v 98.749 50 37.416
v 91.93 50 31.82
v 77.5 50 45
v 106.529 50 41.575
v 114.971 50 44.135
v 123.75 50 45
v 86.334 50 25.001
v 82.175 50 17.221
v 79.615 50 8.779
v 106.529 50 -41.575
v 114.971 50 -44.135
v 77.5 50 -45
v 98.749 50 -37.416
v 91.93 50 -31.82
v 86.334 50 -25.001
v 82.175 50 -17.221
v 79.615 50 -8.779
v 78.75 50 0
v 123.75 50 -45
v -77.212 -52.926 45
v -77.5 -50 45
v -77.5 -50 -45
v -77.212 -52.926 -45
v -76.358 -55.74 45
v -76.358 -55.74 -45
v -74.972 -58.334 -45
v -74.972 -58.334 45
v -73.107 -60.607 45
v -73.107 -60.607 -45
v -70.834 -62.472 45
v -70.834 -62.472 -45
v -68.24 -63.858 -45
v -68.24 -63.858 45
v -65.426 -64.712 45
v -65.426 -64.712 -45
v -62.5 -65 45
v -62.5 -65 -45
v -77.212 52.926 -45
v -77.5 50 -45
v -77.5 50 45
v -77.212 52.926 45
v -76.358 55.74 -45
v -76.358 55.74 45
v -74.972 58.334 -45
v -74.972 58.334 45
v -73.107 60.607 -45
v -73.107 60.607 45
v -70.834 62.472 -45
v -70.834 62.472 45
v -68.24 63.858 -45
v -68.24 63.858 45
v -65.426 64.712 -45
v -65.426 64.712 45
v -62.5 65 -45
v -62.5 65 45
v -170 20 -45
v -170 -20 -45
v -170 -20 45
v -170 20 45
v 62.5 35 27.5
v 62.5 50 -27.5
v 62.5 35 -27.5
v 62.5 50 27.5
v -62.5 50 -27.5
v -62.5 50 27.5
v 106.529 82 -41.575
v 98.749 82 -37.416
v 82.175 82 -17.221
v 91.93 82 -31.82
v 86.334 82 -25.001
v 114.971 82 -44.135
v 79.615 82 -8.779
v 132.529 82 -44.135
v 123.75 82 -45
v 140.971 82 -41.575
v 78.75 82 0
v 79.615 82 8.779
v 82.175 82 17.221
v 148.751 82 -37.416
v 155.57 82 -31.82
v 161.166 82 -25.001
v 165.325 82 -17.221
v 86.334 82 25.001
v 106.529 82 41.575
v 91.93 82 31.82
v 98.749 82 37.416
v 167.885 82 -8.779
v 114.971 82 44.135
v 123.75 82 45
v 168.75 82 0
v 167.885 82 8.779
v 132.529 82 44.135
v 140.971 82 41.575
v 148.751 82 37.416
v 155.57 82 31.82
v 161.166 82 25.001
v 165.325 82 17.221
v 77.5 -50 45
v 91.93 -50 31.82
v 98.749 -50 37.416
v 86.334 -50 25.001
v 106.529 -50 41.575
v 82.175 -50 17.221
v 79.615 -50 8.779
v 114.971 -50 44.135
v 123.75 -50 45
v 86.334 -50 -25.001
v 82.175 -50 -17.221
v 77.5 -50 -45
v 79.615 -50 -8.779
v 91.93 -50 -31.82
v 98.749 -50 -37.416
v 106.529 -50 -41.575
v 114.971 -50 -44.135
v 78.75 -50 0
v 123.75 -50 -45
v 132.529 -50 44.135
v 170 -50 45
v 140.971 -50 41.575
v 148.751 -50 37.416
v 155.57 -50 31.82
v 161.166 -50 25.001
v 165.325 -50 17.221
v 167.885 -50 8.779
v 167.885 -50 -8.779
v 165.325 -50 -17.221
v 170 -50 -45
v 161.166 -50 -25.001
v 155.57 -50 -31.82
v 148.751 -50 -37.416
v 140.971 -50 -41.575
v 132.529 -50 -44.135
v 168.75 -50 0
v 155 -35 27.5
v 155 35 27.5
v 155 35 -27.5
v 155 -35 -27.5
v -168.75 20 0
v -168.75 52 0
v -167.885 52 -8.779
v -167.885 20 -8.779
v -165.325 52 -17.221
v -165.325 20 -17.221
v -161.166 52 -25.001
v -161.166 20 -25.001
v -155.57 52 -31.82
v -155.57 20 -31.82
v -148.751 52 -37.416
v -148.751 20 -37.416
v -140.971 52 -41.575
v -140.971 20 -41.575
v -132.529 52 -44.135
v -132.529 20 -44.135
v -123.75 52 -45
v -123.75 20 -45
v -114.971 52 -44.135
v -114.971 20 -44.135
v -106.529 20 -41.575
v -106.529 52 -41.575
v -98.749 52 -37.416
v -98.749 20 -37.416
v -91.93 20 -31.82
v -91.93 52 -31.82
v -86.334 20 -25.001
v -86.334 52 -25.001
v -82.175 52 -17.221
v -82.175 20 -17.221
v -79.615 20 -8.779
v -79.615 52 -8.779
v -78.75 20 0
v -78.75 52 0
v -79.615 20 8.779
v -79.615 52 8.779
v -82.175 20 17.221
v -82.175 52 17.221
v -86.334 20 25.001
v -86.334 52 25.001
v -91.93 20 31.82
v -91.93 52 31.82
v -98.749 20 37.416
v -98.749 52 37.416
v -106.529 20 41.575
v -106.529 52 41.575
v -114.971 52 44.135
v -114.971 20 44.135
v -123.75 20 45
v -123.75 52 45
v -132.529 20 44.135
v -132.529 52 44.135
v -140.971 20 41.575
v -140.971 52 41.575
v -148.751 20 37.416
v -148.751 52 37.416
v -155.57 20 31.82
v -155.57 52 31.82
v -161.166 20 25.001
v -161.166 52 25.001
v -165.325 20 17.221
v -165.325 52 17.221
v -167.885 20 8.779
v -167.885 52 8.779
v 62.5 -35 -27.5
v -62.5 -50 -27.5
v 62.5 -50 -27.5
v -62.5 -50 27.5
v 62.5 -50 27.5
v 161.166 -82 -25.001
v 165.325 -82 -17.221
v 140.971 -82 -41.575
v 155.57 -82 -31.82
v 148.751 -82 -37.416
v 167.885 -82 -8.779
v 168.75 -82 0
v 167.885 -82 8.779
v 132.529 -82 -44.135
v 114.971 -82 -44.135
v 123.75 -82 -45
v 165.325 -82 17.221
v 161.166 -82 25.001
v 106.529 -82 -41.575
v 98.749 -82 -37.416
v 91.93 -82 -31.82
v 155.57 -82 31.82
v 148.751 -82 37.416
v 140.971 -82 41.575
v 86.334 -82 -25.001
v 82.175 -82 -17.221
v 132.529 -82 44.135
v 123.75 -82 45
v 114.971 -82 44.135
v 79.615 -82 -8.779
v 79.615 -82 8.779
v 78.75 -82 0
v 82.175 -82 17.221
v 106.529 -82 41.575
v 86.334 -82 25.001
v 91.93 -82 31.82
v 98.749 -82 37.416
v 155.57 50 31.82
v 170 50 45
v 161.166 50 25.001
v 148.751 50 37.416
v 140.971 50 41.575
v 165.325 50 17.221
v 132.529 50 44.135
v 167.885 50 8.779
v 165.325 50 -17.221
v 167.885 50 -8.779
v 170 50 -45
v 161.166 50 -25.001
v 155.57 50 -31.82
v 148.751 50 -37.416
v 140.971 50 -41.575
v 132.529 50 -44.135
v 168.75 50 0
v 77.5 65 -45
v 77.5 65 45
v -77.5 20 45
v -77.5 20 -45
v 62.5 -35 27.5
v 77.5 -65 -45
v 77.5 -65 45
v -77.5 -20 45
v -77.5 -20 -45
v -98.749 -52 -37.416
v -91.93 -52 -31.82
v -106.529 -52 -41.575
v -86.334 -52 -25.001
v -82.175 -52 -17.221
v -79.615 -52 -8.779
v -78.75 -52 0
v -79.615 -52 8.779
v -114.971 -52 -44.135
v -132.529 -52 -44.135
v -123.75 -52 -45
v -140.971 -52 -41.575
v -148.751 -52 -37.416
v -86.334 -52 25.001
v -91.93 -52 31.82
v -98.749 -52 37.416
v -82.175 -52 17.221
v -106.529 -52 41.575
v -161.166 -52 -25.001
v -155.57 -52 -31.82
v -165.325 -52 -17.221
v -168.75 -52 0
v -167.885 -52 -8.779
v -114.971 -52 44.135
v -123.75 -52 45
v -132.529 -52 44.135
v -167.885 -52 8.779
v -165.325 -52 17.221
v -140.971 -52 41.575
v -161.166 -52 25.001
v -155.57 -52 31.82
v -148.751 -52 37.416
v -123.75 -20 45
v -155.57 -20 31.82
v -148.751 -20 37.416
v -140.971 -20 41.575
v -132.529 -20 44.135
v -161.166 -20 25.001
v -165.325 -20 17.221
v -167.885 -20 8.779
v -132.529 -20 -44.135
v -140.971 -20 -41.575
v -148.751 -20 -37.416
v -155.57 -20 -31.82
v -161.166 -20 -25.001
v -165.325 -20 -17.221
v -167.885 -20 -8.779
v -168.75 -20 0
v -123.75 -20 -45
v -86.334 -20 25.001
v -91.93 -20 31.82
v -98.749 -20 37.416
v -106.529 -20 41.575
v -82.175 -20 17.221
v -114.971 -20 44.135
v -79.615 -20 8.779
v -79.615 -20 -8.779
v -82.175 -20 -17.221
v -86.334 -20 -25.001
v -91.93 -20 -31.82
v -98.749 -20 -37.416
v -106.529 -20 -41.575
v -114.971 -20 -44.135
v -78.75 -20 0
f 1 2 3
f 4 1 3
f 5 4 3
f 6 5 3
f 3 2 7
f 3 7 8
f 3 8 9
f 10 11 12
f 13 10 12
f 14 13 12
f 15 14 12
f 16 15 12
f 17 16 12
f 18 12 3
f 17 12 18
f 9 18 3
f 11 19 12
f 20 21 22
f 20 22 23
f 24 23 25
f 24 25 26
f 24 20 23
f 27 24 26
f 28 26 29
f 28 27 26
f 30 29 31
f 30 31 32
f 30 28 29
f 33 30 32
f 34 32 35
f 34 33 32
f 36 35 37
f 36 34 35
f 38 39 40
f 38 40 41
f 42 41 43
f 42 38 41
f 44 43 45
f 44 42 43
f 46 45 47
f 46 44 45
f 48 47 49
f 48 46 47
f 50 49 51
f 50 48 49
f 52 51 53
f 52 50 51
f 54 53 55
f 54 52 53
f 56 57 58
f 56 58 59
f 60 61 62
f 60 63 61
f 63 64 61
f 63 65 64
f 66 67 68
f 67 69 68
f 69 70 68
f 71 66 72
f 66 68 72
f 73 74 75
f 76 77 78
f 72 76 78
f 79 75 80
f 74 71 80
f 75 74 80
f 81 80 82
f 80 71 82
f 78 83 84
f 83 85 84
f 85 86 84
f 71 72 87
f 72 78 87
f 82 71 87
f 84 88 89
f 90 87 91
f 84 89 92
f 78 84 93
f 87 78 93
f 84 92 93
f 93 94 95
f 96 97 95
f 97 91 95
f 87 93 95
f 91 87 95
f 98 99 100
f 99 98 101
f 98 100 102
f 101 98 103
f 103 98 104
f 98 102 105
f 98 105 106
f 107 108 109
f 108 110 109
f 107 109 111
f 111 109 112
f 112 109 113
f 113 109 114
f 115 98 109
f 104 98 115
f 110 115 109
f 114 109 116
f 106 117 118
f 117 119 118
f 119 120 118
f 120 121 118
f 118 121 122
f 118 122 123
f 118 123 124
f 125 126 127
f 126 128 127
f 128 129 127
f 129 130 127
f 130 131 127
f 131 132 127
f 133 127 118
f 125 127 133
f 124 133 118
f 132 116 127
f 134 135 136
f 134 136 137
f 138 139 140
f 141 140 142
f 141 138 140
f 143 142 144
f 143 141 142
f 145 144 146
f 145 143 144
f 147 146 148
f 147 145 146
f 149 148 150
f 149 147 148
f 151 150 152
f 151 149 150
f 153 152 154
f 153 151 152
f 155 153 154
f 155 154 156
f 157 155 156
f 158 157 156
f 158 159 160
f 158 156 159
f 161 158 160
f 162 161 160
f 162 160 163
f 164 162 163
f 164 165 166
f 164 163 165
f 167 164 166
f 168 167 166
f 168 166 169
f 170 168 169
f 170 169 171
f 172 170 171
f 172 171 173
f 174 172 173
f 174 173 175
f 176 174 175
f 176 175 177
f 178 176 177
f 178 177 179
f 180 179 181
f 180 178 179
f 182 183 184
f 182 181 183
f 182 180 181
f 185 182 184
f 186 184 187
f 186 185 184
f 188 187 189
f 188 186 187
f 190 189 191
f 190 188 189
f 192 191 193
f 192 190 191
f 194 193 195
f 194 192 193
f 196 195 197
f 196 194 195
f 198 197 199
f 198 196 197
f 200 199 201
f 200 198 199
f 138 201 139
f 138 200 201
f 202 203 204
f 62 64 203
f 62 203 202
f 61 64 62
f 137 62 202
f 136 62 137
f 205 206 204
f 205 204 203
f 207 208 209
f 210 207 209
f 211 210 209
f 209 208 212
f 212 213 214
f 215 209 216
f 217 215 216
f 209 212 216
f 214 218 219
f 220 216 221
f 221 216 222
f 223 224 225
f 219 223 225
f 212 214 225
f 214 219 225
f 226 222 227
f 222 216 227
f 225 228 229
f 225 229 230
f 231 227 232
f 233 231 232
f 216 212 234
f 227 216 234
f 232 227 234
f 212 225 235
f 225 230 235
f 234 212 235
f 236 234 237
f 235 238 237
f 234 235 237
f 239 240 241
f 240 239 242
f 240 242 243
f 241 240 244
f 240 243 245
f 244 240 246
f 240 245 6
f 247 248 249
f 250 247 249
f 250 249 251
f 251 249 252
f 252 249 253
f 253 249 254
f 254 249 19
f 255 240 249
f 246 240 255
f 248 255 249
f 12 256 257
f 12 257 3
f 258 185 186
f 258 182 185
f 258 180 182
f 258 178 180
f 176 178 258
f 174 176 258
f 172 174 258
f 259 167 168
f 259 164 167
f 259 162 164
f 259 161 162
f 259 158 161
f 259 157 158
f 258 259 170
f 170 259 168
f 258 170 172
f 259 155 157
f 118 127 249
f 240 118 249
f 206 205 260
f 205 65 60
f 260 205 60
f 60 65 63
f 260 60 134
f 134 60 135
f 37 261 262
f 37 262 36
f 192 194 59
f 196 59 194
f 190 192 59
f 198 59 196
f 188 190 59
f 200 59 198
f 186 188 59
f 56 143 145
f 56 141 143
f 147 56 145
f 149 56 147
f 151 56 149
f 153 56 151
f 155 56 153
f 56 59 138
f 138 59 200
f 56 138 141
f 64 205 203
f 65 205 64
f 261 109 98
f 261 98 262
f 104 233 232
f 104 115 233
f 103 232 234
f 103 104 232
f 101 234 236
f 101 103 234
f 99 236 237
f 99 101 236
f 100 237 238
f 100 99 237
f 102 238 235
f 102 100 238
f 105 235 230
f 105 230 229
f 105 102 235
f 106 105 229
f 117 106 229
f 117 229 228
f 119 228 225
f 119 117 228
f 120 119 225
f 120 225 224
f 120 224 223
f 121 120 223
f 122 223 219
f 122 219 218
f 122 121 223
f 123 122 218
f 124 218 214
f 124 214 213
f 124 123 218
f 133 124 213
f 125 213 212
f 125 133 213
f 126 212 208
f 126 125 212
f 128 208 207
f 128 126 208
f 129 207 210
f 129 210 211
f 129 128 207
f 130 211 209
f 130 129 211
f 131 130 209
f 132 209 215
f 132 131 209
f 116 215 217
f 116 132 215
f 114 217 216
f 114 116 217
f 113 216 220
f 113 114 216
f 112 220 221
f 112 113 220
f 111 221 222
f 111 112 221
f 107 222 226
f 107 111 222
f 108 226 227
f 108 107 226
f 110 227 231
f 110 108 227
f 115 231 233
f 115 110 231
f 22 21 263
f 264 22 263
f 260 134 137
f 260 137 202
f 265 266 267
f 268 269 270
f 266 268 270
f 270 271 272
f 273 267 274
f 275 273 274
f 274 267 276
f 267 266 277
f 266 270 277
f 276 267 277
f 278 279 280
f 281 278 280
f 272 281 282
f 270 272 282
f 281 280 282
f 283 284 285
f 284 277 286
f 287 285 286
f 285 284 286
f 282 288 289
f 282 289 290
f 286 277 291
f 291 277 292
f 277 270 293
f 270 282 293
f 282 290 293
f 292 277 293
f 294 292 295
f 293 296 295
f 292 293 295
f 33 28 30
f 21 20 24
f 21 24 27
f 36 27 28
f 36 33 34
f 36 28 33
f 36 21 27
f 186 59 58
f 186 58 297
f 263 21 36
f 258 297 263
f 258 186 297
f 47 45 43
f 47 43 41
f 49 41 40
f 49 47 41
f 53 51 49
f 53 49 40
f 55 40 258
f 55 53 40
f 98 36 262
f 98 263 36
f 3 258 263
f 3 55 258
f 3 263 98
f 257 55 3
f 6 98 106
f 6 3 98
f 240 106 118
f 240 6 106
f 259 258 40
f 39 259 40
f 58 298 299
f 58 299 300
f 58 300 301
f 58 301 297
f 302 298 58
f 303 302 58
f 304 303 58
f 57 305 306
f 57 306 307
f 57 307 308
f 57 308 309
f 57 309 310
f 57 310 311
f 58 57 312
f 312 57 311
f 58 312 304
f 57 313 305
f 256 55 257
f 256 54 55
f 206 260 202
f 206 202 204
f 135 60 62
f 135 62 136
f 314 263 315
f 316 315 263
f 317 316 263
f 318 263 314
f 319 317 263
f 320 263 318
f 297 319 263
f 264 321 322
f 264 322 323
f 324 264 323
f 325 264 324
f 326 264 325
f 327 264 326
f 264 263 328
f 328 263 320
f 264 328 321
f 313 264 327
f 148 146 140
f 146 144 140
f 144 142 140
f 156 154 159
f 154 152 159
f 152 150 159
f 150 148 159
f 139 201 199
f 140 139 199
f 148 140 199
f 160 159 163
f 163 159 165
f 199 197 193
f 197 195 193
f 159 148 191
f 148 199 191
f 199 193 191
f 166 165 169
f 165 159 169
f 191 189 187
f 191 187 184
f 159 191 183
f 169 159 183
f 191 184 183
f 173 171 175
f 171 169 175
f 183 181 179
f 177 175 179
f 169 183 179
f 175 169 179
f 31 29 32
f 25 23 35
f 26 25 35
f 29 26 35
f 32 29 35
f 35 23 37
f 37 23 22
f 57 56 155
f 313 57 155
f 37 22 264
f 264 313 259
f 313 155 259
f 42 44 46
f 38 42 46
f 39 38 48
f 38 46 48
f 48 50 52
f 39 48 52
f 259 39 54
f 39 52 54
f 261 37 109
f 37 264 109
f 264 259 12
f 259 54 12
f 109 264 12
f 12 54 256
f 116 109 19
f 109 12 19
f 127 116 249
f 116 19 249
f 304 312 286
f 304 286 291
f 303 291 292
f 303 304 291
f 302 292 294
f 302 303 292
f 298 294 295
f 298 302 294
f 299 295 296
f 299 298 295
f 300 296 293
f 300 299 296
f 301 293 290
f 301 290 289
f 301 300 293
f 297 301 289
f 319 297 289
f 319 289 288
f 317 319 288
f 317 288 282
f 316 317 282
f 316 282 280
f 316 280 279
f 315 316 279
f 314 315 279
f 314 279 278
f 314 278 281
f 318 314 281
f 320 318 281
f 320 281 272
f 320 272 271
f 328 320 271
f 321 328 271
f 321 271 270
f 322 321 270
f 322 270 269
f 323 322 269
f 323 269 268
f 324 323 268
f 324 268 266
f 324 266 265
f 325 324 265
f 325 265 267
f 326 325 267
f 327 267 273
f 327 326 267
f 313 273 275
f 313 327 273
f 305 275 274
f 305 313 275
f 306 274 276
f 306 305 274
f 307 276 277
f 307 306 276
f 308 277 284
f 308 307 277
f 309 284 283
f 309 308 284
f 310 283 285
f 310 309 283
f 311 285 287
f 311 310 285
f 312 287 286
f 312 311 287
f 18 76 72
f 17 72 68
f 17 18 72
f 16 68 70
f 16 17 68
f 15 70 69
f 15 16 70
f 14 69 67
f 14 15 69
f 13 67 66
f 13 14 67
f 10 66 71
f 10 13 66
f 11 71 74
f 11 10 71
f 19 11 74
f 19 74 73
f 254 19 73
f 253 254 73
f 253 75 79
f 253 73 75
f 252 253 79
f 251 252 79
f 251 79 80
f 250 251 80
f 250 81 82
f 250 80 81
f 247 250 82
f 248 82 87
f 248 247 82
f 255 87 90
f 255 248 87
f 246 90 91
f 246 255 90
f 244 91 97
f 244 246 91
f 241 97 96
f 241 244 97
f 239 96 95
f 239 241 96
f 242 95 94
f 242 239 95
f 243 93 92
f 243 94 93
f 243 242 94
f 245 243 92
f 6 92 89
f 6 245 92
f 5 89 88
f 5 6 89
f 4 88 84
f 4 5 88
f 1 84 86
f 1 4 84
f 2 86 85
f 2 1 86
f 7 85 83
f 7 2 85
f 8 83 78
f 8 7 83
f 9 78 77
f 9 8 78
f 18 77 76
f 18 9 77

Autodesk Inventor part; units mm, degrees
ref_plane "YZ Plane" through (0, 0, 0) normal (1, 0, 0) x (0, 1, 0)
ref_plane "XZ Plane" through (0, 0, 0) normal (0, 1, 0) x (-1, 0, 0)
ref_plane "XY Plane" through (0, 0, 0) normal (0, 0, 1) x (1, 0, 0)
sketch "Sketch1" plane through (0, 0, 0) normal (0, 0, 1) x (1, 0, 0)
  line L0 (-170, 20) -> (-77.5, 20)
  line L1 (170, 45) -> (170, 35)
  line L2 (-77.5, -20) -> (-170, -20)
  line L3 (-170, -20) -> (-170, 20)
  line L4 (-77.5, 65) -> (77.5, 65)
  line L5 (77.5, -65) -> (-77.5, -65)
  line L6 (170, 50) -> (77.5, 50)
  line L7 (77.5, -50) -> (170, -50)
  line L8 (170, -50) -> (170, 50)
  line L9 (-77.5, -65) -> (-77.5, -20)
  line L10 (-77.5, 20) -> (-77.5, 65)
  line L11 (-77.5, -20) -> (-77.5, -63.8623)
  line L12 (-170, 0) -> (170, 0) construction
  line L13 (77.5, -50) -> (77.5, -65)
  line L14 (77.5, 65) -> (77.5, 50)
  line L15 (62.5, 35) -> (155, 35)
  line L16 (155, 35) -> (155, -35)
  line L17 (155, -35) -> (62.5, -35)
  line L18 (62.5, -35) -> (62.5, -50)
  line L19 (62.5, -50) -> (-62.5, -50)
  line L20 (-62.5, -50) -> (-62.5, -5)
  line L21 (-62.5, -5) -> (-62.5, 50)
  line L22 (-62.5, 50) -> (62.5, 50)
  line L23 (62.5, 50) -> (62.5, 35)
  line L24 (0, 50) -> (0, -50) construction
  point P0 (0, 0)
  point P1 (170, 5)
  point P2 (170, -5)
  dimension "d2" = 155
  dimension "d3" = 130
  dimension "d21" = 92.5
  dimension "d22" = 100
  dimension "d23" = 40
  dimension "d25" = 92.5
  dimension "d29" = 15
extrude "Extrusion1" add sketch "Sketch1" along normal mid plane 90 contours L0 L10 L4 L14 L6 L8 L1 L7 L13 L5 L9 L2 L3 | L15 L16 L17 L18 L19 L20 L21 L22 L23
sketch "Sketch2" plane through (0, 0, 0) normal (0, 1, 0) x (-1, 0, 0)
  circle A0 centre (-123.75, 0) radius 45
  circle A1 centre (123.75, 0) radius 45
  line L0 (0, 43.1567) -> (0, -43.1567) construction
  line L1 (170.8168, 0) -> (-169.1832, 0) construction
  line L2 (170.8168, 0) -> (-169.1832, 0) construction
  line L3 (170, -45) -> (170, 45) construction
  line L4 (77.5, -45) -> (170, -45) construction
  line L5 (123.75, -45) -> (123.75, 45) construction
  line L6 (170, 45) -> (77.5, 45) construction
  line L7 (-123.75, -45) -> (-123.75, 45) construction
  point P0 (0, 0)
  point P1 (0.8168, 0)
  point P2 (0, 0)
  dimension "d7" = 90
extrude "Extrusion2" add sketch "Sketch2" against normal blind 32 from surface at -50 contours A0
extrude "Extrusion3" add sketch "Sketch2" against normal blind 32 from surface at -20 contours A1
fillet "Fillet1" radius 15 2 edges at (-77.5, 65, 0) (-77.5, -65, 0)
mirror "Mirror1" about plane through (0, 0, 0) normal (0, 1, 0) of "Extrusion3", "Extrusion2"
extrude "Extrusion4" cut sketch "Sketch1" against normal mid plane 55 contours L15 L16 L17 L18 L19 L20 L21 L22 L23
